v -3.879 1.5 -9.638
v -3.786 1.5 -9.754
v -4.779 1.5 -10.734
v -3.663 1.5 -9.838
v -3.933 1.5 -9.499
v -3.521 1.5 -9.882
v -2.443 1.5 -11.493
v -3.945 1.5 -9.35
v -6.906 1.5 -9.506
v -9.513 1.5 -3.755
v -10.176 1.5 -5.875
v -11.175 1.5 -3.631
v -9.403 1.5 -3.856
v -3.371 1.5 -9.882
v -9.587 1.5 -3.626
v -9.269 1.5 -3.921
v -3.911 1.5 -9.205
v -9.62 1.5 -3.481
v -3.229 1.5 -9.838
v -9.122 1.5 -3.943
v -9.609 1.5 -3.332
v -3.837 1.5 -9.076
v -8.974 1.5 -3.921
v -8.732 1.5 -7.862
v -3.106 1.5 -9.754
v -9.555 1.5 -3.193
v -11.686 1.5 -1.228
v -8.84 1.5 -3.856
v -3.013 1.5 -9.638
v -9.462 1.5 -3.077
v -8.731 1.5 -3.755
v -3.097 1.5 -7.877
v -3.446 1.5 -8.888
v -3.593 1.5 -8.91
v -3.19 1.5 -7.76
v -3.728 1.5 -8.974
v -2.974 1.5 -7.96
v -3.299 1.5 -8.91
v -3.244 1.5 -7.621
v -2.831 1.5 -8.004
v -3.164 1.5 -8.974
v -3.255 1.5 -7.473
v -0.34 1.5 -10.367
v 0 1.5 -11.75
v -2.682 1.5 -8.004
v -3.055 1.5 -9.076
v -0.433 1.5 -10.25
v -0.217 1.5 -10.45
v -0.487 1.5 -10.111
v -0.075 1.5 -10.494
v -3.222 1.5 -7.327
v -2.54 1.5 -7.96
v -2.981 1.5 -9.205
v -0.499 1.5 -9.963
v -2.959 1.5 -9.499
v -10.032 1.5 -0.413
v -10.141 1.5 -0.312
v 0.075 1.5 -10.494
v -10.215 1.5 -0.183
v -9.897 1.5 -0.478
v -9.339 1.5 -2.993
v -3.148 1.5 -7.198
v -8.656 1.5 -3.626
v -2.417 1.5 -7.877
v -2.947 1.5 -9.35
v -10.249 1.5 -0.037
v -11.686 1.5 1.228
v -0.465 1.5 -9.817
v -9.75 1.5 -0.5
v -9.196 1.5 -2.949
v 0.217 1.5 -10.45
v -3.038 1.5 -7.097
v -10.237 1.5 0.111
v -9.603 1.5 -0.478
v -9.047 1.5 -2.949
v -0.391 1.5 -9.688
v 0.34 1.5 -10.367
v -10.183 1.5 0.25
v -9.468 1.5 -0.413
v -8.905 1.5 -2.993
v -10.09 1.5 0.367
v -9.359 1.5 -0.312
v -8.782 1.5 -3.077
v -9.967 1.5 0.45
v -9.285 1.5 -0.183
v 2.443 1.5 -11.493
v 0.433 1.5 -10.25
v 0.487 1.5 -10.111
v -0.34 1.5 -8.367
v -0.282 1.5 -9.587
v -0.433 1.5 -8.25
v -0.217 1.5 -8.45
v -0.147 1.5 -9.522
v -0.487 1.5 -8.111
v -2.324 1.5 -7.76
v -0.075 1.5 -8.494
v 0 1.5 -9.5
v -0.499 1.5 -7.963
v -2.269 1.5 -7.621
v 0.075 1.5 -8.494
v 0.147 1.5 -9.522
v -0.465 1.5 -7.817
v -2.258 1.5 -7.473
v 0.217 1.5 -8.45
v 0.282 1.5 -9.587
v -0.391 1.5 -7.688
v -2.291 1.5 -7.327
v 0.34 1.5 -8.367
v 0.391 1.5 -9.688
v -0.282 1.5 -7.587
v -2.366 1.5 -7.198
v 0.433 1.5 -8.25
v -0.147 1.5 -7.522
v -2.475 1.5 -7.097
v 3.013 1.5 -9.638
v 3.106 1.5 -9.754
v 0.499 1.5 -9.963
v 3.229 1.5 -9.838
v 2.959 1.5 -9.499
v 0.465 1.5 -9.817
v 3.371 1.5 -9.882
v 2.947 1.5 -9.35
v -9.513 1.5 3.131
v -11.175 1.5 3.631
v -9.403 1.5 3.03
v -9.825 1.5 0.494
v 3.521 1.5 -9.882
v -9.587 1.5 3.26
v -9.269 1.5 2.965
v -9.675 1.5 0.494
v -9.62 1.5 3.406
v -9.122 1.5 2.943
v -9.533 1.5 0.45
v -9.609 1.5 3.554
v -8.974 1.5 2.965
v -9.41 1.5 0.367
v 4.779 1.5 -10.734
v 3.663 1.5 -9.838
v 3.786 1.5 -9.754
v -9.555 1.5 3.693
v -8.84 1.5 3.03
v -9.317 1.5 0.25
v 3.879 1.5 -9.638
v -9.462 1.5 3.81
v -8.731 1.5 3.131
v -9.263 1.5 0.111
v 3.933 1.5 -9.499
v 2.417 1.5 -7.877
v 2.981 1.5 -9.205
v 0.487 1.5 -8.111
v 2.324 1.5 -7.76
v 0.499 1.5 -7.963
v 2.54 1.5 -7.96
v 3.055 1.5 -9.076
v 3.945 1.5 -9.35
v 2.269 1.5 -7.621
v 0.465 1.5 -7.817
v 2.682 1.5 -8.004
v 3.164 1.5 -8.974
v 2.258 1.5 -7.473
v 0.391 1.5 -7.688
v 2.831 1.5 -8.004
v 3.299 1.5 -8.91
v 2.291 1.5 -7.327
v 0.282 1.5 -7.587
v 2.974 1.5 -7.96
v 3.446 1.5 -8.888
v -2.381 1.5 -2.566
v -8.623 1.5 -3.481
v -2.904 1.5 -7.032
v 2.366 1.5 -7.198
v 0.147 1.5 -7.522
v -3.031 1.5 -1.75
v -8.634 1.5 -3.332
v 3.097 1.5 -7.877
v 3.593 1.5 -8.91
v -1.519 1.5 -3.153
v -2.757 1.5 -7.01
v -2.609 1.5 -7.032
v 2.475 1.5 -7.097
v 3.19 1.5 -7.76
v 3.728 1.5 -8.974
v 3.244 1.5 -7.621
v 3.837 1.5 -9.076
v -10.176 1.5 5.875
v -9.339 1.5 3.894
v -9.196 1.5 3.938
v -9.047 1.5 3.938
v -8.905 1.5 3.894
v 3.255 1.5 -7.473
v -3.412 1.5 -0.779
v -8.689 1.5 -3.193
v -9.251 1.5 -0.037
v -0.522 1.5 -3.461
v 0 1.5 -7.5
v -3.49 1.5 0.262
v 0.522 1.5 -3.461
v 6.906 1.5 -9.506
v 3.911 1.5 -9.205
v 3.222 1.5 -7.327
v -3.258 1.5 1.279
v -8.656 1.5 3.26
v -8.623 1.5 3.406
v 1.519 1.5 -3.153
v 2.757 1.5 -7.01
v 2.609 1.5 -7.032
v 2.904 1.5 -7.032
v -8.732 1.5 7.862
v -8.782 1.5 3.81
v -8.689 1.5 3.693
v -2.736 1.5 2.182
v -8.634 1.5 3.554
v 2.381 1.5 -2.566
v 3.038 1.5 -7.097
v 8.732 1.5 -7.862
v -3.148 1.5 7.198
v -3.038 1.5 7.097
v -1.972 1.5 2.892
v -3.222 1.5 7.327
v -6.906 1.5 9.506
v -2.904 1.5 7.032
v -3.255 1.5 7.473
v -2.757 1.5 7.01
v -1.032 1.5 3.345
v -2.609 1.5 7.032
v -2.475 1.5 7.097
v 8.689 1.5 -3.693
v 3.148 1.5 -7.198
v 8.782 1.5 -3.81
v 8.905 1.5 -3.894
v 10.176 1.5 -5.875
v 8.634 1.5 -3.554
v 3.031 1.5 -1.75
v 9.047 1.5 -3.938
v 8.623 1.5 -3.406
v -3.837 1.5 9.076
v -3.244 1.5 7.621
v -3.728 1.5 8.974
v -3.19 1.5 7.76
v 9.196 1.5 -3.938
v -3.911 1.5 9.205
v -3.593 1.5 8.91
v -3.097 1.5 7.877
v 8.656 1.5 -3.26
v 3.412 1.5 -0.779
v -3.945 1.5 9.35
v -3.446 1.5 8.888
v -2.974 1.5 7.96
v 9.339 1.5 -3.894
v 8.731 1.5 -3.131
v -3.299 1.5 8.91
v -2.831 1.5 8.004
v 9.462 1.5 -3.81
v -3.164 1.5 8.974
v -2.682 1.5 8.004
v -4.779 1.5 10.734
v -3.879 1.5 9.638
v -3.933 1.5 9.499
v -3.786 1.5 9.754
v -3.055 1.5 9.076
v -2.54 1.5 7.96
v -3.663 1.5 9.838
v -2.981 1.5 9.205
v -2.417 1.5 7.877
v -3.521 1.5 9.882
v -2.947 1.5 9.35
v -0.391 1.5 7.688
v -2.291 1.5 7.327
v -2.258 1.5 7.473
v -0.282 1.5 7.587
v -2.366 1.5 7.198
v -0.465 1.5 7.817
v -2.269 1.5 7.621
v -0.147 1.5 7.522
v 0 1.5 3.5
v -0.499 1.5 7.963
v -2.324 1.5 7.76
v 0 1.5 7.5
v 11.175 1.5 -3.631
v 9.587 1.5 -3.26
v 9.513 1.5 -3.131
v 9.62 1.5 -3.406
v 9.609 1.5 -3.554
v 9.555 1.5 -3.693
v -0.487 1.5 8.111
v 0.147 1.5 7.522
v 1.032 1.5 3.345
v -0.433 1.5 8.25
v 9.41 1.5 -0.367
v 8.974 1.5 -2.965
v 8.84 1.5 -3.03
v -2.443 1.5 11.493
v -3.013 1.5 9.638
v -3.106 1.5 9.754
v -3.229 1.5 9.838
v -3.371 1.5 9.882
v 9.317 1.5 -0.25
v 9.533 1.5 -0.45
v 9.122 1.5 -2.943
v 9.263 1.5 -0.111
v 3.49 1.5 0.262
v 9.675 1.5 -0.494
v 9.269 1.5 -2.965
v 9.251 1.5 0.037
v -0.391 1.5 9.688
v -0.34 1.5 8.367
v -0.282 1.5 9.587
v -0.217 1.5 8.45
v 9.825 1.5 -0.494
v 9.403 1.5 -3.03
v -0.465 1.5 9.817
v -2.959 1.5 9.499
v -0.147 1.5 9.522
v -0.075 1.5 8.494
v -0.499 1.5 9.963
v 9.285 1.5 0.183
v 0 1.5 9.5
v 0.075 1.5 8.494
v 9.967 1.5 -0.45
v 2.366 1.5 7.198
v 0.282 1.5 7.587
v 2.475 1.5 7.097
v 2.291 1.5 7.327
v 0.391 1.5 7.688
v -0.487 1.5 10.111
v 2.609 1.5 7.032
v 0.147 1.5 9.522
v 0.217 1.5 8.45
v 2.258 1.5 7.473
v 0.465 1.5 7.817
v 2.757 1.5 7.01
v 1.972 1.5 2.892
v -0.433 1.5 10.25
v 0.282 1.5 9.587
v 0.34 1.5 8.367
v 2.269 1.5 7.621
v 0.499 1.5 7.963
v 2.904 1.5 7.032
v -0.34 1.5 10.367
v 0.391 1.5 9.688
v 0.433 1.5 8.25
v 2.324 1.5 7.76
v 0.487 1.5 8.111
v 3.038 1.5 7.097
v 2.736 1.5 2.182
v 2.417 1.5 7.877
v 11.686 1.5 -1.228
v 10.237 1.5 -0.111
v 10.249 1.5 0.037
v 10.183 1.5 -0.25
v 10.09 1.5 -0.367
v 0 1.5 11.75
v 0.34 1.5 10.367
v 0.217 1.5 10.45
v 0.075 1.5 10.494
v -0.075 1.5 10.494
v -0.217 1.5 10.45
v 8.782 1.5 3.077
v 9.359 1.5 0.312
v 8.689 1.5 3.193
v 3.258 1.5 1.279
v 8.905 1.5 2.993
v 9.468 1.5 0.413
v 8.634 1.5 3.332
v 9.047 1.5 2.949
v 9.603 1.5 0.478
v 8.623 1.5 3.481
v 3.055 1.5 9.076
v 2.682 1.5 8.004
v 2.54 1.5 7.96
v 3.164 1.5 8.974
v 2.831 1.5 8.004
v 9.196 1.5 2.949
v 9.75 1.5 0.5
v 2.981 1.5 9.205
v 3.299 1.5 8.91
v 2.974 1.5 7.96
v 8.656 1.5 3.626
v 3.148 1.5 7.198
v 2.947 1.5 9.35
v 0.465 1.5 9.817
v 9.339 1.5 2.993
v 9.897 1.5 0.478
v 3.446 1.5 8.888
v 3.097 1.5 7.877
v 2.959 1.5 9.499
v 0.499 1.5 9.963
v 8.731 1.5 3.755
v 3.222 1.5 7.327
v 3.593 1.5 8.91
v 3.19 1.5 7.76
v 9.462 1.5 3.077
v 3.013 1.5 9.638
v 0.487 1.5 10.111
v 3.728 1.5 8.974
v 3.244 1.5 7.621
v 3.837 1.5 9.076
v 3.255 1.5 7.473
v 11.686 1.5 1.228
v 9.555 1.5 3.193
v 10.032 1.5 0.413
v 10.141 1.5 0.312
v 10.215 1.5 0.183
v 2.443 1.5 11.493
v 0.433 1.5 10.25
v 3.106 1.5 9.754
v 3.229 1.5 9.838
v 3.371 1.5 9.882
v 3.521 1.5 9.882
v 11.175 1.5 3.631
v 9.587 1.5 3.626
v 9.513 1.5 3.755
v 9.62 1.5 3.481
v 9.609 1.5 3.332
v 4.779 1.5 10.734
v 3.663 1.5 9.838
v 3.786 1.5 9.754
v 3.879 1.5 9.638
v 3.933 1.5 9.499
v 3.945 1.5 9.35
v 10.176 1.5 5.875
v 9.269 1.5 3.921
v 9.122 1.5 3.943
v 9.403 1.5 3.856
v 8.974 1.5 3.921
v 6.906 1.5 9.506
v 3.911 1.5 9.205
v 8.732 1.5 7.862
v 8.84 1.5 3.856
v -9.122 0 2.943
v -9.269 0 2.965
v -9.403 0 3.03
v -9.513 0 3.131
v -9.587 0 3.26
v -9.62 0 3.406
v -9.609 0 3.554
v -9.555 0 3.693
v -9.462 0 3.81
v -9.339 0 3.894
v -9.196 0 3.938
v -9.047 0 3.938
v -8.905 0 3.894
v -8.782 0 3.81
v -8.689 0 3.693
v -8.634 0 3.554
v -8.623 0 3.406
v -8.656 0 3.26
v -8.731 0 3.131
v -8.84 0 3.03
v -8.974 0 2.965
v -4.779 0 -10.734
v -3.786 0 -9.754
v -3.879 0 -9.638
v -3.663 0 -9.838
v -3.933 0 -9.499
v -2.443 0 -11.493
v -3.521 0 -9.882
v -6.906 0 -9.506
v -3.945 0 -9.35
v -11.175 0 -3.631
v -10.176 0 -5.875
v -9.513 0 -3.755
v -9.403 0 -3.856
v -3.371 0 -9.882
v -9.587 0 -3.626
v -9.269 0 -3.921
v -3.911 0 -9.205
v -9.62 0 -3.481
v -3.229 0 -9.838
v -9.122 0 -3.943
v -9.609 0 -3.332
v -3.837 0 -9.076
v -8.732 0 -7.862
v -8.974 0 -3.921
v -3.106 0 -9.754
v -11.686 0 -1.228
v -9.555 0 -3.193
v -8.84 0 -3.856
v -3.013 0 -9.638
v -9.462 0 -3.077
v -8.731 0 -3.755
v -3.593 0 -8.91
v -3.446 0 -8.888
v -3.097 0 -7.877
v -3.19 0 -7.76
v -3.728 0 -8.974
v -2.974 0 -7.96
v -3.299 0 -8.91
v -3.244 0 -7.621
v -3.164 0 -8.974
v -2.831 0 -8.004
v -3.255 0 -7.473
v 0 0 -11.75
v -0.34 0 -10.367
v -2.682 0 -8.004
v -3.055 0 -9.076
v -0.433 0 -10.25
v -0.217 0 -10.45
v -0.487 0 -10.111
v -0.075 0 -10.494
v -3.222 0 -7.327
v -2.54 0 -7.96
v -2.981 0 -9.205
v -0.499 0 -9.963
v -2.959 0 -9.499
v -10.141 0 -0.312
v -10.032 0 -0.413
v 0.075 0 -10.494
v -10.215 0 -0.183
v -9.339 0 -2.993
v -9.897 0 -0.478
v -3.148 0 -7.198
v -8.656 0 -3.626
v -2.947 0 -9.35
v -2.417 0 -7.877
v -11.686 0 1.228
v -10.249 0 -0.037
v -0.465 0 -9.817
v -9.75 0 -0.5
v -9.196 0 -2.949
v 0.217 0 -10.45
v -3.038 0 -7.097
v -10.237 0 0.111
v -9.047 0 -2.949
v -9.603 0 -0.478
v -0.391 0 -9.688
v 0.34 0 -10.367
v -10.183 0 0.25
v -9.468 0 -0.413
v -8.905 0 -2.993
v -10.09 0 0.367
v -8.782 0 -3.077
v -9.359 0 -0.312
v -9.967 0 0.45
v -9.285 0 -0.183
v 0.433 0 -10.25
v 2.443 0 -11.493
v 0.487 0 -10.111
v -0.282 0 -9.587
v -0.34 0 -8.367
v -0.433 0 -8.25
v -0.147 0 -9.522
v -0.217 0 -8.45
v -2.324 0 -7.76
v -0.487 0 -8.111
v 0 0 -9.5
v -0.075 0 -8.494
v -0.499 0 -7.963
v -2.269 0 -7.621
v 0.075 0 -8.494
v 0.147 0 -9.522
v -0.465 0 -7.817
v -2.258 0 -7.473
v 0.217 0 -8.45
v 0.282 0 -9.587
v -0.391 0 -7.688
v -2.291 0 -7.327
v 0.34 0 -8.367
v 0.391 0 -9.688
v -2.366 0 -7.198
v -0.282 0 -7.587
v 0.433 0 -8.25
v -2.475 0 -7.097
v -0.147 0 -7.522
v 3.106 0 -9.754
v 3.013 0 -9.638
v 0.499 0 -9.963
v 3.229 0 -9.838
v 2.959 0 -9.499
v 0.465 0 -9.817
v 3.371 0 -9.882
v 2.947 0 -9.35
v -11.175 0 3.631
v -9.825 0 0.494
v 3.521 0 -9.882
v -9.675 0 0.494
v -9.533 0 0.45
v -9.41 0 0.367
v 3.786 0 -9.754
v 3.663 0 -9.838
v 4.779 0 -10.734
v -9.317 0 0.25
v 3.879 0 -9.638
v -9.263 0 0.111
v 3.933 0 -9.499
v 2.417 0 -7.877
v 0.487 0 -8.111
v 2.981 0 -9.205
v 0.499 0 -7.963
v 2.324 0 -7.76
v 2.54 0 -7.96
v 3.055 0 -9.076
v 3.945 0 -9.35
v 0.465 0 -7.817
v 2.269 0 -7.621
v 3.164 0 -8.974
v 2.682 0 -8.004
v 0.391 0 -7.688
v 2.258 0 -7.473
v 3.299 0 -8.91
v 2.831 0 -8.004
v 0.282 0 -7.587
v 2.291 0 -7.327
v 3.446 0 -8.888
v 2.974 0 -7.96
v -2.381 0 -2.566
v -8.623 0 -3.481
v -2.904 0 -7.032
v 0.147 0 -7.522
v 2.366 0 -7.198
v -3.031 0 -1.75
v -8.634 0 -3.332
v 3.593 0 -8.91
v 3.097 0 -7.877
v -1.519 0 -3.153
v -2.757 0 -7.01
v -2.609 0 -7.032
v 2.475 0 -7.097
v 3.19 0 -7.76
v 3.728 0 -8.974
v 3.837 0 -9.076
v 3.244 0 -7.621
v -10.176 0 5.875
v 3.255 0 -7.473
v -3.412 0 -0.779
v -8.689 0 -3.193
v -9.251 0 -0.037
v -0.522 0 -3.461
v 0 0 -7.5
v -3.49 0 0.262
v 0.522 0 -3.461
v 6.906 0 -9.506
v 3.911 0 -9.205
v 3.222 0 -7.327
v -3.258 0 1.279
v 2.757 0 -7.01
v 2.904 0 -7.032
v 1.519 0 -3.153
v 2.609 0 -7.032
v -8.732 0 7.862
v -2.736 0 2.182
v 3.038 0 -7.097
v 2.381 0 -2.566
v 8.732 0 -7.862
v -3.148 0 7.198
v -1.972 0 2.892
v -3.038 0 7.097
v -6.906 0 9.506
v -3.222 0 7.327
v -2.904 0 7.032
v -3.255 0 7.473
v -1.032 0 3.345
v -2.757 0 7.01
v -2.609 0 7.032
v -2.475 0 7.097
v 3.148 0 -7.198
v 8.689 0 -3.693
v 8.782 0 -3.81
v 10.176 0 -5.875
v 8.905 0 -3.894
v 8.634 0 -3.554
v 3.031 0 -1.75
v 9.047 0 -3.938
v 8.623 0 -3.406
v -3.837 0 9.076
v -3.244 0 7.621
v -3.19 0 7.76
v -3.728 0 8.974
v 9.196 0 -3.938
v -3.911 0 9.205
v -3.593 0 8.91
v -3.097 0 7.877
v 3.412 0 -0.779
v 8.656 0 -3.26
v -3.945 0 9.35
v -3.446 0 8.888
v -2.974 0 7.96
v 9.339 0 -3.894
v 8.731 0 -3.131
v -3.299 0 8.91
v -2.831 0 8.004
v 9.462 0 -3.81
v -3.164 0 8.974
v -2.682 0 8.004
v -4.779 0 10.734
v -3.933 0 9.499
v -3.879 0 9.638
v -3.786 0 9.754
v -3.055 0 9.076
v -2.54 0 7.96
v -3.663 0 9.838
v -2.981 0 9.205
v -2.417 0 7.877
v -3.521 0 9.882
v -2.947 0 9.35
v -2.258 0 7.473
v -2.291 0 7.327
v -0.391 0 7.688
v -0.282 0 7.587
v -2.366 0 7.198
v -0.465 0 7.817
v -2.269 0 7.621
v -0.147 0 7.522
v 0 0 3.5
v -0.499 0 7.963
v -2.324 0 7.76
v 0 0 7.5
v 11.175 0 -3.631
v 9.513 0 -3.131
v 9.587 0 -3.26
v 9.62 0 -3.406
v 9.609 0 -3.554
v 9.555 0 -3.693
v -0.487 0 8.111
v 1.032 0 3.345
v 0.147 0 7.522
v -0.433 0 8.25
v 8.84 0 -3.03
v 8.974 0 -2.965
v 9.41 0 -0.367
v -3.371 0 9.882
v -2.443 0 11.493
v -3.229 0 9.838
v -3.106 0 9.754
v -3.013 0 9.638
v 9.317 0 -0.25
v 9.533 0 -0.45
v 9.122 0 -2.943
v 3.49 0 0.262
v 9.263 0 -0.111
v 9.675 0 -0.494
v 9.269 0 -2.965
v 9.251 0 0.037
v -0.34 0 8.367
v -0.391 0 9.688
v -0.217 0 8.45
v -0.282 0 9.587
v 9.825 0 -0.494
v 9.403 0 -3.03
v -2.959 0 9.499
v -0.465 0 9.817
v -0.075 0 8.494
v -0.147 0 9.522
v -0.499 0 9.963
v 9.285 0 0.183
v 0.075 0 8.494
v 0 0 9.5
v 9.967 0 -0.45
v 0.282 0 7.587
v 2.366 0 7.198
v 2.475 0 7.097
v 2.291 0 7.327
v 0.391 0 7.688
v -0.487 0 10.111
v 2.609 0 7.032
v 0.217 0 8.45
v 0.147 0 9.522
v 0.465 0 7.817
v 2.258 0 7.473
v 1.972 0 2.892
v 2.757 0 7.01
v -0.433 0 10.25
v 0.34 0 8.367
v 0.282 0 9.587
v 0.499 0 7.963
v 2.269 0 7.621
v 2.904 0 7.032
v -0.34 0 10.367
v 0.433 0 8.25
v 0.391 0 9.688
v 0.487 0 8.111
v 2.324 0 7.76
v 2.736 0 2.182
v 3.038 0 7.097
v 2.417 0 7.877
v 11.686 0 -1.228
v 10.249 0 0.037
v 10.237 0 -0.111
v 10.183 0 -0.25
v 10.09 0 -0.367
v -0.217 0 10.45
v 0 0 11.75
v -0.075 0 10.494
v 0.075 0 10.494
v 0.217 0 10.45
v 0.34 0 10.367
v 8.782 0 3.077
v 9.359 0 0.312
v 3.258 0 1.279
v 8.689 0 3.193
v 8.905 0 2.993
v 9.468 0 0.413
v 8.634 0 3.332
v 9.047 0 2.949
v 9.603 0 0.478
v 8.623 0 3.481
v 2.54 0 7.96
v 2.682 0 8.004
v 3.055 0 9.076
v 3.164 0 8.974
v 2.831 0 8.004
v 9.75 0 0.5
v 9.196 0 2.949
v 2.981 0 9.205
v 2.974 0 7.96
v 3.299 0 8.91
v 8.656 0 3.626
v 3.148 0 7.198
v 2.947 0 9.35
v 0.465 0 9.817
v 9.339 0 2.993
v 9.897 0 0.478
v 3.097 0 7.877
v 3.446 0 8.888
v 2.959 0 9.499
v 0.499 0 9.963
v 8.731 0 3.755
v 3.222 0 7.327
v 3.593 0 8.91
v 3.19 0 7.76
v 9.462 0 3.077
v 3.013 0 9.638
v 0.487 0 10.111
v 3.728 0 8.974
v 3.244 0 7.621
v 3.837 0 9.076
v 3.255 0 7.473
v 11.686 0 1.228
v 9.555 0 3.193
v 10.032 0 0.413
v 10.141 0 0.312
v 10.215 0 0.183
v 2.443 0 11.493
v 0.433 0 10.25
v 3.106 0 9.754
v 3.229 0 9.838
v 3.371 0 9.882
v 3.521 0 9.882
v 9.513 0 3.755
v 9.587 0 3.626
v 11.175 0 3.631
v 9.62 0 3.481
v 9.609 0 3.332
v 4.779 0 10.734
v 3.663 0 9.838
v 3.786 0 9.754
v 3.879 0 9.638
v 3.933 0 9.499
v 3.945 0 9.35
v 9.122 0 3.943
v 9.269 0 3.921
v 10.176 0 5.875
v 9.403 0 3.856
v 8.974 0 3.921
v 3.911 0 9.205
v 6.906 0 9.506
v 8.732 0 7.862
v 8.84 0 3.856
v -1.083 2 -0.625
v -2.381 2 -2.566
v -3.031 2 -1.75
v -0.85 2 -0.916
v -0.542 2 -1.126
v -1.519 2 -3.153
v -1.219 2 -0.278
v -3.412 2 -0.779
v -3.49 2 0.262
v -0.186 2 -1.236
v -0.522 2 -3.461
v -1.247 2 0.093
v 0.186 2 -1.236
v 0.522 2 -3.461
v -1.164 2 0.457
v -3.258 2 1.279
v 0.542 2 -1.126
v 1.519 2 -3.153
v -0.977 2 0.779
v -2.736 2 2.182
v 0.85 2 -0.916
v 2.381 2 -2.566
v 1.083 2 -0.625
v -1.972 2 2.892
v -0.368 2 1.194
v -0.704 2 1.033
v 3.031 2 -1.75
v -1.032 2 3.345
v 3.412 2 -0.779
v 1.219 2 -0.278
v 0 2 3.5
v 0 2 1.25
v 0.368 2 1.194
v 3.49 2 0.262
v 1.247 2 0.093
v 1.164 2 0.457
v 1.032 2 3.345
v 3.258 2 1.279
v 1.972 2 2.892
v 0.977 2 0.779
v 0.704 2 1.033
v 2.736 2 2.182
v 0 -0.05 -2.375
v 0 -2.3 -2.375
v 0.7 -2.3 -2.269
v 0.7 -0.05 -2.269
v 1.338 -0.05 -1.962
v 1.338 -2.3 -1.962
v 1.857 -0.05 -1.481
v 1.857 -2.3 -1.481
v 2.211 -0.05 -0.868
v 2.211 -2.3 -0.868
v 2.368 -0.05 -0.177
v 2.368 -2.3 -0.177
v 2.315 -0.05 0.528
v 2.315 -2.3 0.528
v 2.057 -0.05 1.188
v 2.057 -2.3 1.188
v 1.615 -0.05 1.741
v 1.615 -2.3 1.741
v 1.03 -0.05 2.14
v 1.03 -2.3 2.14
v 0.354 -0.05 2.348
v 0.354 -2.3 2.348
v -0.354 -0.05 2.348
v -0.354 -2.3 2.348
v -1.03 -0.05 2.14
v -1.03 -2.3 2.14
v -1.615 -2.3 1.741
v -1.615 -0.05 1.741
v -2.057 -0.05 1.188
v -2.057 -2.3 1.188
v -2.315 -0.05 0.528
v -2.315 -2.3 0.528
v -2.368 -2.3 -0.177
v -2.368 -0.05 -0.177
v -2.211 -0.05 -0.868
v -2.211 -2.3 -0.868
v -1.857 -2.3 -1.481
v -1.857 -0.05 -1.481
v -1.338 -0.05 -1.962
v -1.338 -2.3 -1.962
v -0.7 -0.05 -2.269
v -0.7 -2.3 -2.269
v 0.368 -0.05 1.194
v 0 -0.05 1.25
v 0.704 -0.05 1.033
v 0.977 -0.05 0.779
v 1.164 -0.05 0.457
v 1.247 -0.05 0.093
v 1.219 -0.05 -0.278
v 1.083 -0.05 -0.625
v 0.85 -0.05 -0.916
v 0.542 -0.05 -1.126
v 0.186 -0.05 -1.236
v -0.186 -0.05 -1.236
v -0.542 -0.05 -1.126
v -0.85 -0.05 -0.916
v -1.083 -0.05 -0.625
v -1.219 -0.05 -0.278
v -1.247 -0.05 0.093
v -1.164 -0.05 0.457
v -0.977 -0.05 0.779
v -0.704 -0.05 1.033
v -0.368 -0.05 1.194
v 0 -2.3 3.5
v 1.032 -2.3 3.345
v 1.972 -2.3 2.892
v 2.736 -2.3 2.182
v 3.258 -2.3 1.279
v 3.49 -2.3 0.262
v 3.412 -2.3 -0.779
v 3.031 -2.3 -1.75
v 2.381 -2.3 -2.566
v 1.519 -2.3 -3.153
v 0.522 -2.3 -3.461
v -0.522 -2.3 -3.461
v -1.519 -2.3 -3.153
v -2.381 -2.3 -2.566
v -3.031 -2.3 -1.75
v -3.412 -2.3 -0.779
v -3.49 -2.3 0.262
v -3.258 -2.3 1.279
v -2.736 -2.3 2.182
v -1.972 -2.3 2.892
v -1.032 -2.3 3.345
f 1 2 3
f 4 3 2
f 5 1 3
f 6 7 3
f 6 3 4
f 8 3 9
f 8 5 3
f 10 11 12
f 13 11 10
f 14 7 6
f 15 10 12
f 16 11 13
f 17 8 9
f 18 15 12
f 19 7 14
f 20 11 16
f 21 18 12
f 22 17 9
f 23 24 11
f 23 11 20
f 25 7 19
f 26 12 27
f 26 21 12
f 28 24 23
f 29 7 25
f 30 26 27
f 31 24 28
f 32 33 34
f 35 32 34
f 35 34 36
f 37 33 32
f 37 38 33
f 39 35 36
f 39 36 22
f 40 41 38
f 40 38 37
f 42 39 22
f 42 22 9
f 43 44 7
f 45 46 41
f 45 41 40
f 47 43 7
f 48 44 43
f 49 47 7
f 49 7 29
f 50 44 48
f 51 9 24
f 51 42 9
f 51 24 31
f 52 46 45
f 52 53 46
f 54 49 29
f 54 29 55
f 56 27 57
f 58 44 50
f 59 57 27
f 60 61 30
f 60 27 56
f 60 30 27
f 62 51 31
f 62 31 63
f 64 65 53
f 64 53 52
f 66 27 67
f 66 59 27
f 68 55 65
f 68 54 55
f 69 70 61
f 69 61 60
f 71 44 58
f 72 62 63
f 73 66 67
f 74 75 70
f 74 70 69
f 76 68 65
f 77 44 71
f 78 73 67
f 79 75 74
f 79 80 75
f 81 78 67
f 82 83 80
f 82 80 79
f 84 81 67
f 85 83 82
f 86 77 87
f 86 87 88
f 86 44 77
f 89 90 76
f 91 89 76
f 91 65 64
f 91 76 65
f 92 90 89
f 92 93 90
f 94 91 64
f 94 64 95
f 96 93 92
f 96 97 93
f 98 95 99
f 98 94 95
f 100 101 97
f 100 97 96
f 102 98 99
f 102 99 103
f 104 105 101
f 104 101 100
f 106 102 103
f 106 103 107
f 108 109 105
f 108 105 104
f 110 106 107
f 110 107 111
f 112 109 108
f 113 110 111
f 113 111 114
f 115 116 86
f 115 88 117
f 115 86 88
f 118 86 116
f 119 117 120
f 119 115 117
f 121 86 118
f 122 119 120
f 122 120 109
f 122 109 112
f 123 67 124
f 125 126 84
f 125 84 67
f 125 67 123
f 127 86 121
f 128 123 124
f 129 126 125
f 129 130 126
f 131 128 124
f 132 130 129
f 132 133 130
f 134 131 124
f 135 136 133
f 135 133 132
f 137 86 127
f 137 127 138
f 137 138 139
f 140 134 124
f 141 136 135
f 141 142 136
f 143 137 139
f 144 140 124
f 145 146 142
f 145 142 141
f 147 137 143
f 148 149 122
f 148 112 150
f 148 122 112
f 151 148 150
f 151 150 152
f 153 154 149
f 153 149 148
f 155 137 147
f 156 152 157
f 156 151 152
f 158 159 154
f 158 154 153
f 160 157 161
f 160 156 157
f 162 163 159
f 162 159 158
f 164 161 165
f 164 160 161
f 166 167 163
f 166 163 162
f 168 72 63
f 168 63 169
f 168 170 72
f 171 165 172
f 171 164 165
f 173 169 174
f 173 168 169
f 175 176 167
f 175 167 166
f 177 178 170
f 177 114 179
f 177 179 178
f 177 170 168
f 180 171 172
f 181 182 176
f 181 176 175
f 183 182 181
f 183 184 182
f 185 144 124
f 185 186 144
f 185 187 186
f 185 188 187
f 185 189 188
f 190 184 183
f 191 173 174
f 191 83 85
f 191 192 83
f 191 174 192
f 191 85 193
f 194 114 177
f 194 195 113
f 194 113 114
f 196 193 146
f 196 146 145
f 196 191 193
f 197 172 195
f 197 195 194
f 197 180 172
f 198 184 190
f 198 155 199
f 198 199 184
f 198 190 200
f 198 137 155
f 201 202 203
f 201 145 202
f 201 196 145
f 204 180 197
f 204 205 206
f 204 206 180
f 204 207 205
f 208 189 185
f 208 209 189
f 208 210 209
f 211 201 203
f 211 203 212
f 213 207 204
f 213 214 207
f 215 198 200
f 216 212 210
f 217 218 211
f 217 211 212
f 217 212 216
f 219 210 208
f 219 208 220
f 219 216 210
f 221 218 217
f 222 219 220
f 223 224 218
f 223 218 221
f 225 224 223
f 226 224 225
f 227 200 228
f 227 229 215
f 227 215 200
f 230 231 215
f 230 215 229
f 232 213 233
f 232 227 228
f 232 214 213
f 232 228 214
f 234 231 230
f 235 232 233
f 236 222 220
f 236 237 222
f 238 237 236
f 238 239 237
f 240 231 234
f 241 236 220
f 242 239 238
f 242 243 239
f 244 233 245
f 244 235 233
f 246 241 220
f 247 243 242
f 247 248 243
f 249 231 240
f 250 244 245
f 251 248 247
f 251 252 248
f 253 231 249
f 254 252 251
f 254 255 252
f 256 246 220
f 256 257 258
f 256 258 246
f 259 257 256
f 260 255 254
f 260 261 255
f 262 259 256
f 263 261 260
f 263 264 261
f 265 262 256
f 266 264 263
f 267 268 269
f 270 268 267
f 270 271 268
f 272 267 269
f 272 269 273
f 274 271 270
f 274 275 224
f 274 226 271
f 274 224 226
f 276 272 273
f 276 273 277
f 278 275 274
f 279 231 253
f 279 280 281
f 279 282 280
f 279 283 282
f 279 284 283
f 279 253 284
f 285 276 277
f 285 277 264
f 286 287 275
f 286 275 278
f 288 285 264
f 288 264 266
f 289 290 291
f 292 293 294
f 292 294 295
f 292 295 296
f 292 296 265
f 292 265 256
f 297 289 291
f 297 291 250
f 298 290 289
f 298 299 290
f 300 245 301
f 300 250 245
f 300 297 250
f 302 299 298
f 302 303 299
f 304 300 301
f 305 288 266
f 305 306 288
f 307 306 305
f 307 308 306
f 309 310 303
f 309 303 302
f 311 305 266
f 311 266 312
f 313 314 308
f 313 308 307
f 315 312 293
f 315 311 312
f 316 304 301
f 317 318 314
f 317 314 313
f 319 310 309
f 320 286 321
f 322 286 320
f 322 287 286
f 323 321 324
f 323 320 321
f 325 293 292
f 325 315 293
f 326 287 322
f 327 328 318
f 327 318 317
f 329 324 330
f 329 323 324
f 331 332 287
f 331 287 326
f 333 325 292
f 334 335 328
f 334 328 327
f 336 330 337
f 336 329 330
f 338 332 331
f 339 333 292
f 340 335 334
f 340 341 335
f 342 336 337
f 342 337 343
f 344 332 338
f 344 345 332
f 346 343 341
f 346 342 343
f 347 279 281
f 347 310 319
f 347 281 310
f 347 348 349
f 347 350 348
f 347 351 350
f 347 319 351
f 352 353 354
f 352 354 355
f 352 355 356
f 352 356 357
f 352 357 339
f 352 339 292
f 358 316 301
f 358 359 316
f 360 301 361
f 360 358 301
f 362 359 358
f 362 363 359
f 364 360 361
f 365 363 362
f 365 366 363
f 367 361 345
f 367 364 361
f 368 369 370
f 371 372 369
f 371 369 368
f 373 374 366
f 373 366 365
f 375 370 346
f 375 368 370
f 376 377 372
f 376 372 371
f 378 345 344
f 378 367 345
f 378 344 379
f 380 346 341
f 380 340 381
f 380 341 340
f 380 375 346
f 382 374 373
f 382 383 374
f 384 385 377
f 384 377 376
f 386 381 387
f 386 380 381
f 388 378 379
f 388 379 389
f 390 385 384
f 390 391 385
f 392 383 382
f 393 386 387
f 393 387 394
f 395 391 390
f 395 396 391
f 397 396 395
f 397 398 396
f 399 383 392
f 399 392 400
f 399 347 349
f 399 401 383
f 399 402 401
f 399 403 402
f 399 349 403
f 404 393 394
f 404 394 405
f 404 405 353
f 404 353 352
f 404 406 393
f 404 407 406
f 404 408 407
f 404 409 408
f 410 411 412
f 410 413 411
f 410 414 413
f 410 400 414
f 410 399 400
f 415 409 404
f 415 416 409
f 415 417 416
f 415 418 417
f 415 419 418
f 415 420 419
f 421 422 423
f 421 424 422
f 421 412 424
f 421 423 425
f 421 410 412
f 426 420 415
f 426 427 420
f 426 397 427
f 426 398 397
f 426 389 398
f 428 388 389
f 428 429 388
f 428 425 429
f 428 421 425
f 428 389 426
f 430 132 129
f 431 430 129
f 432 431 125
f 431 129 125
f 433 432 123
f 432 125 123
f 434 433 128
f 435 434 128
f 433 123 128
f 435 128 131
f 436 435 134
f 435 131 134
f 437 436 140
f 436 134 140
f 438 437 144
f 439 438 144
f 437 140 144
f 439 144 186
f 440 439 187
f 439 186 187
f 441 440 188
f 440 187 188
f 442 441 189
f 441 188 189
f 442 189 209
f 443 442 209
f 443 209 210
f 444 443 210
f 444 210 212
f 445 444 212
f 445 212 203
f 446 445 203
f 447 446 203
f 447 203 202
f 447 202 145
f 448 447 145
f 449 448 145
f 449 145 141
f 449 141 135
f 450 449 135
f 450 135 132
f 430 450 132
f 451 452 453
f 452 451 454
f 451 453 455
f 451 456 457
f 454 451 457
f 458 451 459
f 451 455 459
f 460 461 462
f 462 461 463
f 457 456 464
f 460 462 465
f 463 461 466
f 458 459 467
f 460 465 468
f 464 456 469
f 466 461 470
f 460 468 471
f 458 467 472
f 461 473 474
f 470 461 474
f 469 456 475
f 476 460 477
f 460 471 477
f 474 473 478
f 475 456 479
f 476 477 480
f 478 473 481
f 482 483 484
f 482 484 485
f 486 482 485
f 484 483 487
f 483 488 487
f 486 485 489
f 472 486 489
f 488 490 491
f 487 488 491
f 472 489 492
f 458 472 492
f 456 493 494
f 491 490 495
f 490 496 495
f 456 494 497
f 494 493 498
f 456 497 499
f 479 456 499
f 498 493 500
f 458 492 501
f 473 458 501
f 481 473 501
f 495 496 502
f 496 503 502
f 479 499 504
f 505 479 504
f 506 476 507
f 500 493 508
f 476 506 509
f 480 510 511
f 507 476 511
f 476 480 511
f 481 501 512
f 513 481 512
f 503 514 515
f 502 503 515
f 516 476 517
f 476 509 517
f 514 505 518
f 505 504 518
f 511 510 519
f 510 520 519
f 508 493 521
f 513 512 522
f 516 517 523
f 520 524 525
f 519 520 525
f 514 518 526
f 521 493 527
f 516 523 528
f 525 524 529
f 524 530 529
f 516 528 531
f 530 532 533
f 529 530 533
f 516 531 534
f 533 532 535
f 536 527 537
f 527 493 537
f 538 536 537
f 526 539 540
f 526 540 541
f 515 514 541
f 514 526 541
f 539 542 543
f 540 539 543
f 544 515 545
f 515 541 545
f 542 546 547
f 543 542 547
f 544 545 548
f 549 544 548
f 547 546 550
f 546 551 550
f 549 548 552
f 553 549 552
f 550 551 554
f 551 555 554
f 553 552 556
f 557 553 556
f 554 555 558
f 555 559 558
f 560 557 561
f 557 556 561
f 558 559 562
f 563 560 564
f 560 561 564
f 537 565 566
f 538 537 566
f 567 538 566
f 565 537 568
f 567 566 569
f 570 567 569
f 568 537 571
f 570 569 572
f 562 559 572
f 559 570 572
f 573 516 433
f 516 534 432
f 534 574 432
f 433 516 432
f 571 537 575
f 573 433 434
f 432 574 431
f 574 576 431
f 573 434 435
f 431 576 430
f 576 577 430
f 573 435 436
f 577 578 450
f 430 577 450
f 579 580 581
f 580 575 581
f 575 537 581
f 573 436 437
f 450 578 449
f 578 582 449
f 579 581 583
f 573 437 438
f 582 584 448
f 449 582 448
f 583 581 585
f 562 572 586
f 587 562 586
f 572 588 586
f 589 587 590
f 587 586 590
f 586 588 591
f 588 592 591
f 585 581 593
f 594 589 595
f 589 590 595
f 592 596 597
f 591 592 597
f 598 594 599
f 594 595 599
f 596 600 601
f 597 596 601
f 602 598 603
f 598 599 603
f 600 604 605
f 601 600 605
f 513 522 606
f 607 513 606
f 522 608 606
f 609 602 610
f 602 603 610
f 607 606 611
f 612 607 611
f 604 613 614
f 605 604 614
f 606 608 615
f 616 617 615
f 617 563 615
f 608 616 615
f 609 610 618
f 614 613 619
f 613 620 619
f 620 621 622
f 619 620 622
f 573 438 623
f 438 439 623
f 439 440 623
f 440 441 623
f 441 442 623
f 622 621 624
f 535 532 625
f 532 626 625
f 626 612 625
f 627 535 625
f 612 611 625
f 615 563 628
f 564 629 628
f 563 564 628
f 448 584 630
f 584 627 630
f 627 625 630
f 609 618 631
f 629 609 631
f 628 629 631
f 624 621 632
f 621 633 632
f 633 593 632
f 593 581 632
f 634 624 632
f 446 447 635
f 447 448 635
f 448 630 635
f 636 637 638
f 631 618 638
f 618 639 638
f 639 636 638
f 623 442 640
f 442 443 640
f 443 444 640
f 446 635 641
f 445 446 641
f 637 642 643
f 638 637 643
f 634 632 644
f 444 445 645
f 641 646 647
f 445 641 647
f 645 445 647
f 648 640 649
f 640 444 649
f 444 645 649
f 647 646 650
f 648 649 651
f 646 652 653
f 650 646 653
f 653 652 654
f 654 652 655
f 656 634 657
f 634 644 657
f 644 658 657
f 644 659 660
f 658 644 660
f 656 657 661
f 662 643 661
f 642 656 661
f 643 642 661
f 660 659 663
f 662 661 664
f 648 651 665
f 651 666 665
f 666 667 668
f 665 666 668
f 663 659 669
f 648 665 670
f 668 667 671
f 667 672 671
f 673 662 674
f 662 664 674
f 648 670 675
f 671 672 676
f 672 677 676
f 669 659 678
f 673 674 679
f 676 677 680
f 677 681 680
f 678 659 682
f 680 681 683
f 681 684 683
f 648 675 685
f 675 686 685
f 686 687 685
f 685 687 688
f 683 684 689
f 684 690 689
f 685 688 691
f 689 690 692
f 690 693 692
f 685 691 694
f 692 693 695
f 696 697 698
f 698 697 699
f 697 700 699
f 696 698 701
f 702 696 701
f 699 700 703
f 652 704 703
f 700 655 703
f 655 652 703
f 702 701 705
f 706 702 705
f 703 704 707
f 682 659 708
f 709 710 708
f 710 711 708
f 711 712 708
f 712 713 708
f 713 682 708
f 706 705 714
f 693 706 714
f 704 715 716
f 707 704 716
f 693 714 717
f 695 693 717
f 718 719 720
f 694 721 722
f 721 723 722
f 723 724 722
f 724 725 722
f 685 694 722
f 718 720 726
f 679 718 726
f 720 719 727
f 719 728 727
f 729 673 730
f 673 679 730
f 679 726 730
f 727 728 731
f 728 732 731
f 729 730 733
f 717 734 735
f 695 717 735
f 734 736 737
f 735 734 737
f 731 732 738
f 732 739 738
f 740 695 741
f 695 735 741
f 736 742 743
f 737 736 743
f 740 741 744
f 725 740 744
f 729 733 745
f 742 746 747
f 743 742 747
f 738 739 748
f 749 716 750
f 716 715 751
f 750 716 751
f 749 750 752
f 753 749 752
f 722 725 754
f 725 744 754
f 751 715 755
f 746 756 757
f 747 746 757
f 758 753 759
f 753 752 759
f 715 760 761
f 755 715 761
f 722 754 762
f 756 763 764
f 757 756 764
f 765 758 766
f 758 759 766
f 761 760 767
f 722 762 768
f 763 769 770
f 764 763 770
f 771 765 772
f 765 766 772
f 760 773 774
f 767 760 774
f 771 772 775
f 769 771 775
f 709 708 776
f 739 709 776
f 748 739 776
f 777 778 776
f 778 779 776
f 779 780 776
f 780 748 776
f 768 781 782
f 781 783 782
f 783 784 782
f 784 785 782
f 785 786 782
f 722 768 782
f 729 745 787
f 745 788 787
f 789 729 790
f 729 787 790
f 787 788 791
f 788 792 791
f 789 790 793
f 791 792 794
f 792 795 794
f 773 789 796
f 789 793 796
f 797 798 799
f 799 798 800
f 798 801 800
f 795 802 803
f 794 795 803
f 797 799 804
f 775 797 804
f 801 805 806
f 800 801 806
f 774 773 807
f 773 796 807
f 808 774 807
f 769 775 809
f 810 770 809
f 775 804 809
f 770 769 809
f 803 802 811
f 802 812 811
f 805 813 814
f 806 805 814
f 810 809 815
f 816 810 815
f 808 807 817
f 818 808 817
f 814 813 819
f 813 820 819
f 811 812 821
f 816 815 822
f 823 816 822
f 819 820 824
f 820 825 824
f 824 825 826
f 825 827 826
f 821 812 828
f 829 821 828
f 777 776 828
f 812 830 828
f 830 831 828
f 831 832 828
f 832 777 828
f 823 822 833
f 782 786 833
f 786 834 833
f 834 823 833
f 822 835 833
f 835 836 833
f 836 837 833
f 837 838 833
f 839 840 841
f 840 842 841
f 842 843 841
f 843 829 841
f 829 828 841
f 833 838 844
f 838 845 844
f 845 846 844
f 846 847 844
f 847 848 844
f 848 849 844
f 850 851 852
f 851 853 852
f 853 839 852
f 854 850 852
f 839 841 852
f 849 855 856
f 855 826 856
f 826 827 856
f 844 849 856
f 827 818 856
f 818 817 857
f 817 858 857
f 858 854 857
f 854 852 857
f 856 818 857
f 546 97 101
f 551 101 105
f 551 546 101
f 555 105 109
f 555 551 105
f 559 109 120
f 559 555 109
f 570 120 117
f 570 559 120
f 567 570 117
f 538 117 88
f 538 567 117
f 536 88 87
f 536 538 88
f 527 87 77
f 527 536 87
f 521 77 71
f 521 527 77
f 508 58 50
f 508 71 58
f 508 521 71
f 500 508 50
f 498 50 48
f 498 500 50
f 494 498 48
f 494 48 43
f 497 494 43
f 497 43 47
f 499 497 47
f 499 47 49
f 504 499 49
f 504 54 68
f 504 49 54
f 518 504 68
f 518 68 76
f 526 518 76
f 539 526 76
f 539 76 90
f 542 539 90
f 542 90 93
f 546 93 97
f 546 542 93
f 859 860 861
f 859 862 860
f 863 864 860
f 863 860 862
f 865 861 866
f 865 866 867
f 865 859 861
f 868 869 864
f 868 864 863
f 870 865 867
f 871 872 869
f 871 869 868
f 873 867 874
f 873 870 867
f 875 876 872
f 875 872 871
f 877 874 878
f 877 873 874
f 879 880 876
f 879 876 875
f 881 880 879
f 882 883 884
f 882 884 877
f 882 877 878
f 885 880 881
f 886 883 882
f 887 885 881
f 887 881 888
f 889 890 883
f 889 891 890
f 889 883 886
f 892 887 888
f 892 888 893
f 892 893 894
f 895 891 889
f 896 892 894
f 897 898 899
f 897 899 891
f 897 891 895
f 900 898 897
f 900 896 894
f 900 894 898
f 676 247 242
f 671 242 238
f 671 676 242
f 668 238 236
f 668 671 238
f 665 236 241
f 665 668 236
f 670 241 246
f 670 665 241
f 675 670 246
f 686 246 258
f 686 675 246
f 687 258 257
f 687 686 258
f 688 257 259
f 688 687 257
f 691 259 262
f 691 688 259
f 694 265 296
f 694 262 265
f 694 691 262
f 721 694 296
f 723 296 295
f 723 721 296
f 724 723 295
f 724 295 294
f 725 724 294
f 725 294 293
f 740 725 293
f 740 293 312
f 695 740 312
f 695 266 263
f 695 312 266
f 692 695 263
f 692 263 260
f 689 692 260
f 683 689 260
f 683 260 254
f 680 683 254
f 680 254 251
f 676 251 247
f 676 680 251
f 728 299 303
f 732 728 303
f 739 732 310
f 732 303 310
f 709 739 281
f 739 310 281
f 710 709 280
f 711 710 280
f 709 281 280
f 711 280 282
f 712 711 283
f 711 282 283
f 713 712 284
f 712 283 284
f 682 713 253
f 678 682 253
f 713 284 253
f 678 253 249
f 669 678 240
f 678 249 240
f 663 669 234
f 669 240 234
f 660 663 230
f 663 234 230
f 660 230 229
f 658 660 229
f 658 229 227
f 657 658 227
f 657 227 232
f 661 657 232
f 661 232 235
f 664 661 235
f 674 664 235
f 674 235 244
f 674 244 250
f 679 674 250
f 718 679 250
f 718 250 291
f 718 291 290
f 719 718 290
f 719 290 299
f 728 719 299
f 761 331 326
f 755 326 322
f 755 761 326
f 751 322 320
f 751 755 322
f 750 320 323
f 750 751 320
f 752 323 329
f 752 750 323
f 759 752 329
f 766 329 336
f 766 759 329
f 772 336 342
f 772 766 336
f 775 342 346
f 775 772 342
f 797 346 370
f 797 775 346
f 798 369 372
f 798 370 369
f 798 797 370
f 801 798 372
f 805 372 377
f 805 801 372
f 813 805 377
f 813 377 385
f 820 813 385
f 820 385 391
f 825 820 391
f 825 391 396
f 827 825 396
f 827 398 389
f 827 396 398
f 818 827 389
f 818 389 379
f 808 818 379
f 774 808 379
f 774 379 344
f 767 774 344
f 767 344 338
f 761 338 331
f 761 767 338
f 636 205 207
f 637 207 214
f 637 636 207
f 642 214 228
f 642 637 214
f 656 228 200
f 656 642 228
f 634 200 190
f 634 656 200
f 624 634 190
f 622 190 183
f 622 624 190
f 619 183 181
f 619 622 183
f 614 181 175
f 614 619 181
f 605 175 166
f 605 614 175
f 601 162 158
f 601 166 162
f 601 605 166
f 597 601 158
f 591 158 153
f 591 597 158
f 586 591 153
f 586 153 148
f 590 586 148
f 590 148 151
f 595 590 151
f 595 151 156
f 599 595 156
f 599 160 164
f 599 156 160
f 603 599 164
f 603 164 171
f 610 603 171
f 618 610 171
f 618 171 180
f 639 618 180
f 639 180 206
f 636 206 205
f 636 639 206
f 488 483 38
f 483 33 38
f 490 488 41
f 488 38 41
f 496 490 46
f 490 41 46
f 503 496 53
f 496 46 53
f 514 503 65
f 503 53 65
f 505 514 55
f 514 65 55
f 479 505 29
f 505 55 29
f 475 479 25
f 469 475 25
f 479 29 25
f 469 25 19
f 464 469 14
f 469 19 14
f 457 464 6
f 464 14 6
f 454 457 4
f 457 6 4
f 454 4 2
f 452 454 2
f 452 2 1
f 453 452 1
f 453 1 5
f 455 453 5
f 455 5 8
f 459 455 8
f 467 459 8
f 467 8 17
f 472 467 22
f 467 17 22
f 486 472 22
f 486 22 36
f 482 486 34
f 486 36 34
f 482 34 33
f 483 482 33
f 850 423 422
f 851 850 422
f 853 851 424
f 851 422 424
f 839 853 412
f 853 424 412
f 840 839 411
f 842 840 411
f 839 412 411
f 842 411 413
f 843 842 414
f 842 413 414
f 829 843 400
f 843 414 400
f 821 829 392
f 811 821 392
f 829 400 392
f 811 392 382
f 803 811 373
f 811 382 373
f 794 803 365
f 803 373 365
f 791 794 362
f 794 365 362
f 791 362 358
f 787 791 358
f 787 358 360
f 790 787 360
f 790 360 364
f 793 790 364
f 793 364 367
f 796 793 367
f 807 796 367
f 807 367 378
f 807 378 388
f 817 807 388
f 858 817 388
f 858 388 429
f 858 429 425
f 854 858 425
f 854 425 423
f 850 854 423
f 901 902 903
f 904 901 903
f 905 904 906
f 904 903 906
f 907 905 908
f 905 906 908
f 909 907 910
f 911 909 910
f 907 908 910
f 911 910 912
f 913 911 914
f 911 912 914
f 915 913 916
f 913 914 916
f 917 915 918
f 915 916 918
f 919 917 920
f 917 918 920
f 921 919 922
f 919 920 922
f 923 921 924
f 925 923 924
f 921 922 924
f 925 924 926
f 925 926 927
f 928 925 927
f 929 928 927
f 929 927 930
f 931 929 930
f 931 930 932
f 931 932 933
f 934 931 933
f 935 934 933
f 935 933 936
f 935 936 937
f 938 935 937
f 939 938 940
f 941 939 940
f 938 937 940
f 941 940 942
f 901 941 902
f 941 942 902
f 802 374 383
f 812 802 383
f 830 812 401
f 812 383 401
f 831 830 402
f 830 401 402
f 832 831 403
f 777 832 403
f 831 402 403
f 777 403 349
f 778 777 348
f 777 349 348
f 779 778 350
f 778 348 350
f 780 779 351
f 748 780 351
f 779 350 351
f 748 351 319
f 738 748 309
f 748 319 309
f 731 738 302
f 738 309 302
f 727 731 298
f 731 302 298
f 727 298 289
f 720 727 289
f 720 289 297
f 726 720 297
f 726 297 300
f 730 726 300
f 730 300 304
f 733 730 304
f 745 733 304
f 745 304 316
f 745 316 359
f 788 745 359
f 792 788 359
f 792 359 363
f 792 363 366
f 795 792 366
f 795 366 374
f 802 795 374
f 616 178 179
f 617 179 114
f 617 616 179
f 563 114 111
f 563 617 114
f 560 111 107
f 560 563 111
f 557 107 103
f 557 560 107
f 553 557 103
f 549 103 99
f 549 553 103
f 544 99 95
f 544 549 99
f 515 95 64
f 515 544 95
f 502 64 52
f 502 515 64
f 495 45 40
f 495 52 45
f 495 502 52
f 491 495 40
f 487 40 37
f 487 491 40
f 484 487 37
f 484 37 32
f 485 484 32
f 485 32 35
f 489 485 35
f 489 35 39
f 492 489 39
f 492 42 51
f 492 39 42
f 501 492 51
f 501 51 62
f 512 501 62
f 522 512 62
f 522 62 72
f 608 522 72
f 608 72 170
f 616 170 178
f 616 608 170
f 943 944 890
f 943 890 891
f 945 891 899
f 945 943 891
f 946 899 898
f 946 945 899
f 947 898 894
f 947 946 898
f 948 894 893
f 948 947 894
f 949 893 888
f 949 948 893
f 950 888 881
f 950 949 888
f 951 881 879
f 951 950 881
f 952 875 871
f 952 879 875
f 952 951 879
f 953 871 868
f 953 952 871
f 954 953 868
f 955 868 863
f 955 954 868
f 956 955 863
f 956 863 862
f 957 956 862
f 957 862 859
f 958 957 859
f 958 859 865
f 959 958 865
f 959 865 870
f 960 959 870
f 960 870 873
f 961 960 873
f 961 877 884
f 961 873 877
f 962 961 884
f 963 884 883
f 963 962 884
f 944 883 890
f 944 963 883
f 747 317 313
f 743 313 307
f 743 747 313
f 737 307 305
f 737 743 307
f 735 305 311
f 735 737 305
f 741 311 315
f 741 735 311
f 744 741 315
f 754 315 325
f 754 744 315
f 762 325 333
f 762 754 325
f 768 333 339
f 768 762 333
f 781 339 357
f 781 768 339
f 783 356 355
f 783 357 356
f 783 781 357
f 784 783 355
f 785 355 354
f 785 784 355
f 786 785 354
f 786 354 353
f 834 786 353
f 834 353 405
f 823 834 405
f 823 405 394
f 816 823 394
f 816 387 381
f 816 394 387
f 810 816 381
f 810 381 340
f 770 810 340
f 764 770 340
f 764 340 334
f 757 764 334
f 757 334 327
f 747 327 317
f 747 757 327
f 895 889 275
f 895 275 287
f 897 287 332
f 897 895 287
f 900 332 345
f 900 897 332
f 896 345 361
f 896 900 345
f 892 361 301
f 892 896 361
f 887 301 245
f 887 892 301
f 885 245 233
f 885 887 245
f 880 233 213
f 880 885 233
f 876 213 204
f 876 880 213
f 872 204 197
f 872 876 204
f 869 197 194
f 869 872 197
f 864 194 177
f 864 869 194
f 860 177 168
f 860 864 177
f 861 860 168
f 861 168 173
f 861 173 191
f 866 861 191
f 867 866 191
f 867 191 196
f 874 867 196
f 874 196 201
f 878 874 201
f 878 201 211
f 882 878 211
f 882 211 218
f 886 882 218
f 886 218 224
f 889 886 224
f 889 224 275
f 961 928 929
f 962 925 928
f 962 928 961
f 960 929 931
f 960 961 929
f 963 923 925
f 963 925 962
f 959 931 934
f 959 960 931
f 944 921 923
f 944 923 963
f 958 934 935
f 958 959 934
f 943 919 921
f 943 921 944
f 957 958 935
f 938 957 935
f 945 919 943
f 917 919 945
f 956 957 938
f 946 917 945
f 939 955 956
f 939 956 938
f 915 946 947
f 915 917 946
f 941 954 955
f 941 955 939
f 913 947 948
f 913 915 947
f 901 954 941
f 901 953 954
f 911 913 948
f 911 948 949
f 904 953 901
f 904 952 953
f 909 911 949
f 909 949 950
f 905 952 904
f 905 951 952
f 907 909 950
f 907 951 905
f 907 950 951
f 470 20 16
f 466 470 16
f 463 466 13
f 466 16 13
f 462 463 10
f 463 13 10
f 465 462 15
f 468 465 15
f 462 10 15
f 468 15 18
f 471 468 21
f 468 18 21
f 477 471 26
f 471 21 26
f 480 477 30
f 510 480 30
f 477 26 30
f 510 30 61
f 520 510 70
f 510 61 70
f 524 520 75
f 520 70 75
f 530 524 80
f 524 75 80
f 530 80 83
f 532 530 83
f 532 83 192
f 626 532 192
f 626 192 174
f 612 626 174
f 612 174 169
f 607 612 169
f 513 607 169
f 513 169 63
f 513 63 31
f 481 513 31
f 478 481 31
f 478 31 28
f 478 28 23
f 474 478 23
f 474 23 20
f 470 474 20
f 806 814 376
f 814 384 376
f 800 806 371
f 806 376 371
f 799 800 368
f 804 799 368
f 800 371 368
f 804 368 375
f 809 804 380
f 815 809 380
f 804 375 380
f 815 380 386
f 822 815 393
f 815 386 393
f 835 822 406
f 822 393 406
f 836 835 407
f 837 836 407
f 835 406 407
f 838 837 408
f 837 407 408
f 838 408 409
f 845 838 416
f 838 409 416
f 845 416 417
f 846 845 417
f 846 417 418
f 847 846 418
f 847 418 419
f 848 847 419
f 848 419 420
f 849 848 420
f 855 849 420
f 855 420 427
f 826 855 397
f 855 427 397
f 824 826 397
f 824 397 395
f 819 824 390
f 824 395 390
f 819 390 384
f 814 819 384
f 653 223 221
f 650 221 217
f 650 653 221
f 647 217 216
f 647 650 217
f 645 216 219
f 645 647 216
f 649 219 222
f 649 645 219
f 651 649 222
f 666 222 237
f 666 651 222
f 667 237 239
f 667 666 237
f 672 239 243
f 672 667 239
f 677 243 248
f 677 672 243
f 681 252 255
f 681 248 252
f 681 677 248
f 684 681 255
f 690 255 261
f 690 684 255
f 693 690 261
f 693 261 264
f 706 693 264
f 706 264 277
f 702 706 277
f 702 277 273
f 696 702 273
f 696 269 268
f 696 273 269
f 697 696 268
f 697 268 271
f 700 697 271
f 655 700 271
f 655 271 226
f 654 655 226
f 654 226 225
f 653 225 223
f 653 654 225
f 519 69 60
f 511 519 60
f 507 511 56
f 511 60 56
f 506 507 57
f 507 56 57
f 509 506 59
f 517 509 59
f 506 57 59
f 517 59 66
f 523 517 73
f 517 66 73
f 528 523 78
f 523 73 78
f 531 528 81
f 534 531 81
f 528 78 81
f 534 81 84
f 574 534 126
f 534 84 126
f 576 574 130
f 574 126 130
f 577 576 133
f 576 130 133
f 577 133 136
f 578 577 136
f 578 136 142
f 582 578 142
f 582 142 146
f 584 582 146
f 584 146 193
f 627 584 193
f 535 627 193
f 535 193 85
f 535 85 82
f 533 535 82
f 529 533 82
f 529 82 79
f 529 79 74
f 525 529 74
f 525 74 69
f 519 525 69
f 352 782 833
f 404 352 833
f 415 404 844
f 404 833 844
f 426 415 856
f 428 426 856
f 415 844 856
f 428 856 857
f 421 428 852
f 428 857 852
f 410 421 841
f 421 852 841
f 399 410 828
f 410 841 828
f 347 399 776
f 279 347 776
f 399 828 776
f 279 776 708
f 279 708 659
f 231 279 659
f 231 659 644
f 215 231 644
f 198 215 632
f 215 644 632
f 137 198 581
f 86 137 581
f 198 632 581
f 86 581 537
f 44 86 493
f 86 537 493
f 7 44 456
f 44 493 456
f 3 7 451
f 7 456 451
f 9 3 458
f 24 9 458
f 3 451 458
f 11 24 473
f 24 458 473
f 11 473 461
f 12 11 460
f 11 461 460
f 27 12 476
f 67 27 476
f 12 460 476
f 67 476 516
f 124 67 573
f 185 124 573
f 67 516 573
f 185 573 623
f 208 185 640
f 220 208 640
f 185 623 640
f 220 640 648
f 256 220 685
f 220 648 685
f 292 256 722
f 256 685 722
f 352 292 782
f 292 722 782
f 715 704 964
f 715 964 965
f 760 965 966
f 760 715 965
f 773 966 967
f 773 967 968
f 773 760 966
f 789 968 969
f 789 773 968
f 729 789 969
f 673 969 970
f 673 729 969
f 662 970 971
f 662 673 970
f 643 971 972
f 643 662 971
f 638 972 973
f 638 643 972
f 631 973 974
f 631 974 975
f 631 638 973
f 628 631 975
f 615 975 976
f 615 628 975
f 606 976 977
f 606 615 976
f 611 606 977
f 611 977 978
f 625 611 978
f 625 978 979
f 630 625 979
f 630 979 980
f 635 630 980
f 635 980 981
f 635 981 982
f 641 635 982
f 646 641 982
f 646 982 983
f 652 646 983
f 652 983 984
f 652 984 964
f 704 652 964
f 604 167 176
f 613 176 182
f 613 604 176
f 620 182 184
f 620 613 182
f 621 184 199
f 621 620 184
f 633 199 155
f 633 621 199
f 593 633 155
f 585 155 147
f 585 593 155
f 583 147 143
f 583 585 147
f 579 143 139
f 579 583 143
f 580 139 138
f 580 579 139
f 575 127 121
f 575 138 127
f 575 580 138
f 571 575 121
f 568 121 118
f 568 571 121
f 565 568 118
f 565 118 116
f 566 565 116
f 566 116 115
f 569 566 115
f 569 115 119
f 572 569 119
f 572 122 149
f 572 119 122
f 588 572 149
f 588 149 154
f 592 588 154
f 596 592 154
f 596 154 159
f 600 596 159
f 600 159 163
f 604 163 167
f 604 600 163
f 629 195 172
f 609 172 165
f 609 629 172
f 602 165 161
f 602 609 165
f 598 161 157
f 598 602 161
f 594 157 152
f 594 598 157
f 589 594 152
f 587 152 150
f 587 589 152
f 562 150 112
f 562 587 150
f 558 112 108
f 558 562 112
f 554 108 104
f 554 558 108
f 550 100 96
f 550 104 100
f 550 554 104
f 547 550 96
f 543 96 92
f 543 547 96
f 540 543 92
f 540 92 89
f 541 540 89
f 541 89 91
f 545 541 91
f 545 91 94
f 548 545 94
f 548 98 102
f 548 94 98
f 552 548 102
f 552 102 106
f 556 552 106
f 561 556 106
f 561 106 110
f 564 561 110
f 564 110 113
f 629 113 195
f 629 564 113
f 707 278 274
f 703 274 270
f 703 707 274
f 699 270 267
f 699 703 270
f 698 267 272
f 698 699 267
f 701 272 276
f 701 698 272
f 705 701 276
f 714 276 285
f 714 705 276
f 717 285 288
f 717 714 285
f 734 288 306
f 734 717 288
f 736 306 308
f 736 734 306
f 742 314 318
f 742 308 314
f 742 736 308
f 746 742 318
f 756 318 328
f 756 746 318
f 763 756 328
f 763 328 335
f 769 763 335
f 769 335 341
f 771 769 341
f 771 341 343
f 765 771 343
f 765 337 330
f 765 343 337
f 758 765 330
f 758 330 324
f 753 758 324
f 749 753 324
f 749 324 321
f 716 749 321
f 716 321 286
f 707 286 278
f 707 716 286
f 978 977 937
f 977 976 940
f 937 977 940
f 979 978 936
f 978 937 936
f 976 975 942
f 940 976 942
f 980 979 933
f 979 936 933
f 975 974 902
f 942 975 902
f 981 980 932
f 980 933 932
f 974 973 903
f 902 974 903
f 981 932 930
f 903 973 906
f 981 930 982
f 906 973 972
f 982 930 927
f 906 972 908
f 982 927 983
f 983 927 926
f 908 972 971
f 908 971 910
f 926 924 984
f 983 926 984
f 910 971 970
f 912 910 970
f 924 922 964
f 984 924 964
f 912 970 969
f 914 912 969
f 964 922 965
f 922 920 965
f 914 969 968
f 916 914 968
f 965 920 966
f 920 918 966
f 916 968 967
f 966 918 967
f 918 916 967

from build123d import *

# Parameters (mm, degrees)
SKETCH1_R               = 11.75
BOSS_EXTRUDE1_DEPTH     = 1.5
BOSS_EXTRUDE2_START     = 0.5
SKETCH2_R               = 3.5
BOSS_EXTRUDE2_DEPTH     = 4.3
CUT_EXTRUDE1_DEPTH      = 18.164352595
CUT_EXTRUDE1_DEPTH_BACK = 18.164352595
SKETCH3_R               = 1.25
SKETCH4_R               = 0.5
CUT_EXTRUDE2_DEPTH      = 18.045967265
SKETCH5_R               = 0.5
CUT_EXTRUDE3_DEPTH      = 17.77542846
CIRPATTERN1_COUNT       = 2
SKETCH6_R               = 2.375
CUT_EXTRUDE4_DEPTH      = 2.25


with BuildPart() as part:
    # Sketch1 → Boss-Extrude1 (new body)
    with BuildSketch(Plane(origin=(0, 0, 0), x_dir=(1, 0, 0), z_dir=(0, 1, 0))):
        Circle(SKETCH1_R)
    extrude(amount=BOSS_EXTRUDE1_DEPTH)

    # Sketch2 → Boss-Extrude2 (add)
    with BuildSketch(Plane(origin=(0, 1.5, 0), x_dir=(1, 0, 0), z_dir=(0, 1, 0)).offset(BOSS_EXTRUDE2_START)):
        Circle(SKETCH2_R)
    extrude(amount=-BOSS_EXTRUDE2_DEPTH)

    # Sketch3 → Cut-Extrude1 (cut, two sides: drawn at the far end of the back side and taken through both)
    with BuildSketch(Plane(origin=(0, 2, 0), x_dir=(1, 0, 0), z_dir=(0, 1, 0)).offset(-CUT_EXTRUDE1_DEPTH_BACK)):
        Circle(SKETCH3_R)
    extrude(amount=CUT_EXTRUDE1_DEPTH + CUT_EXTRUDE1_DEPTH_BACK, mode=Mode.SUBTRACT)

    # Sketch4 → Cut-Extrude2 (cut, through all)
    with BuildSketch(Plane(origin=(0, 1.5, 0), x_dir=(1, 0, 0), z_dir=(0, 1, 0))):
        with Locations((9.75, 0)):
            Circle(SKETCH4_R)
        with Locations((9.121794872, 3.443161094)):
            Circle(SKETCH4_R)
        with Locations((9.121794872, -3.443161094)):
            Circle(SKETCH4_R)
    cut_extrude2 = extrude(amount=-CUT_EXTRUDE2_DEPTH, mode=Mode.SUBTRACT)

    # Sketch5 → Cut-Extrude3 (cut, symmetric)
    with BuildSketch(Plane(origin=(0, 0, 0), x_dir=(1, 0, 0), z_dir=(0, 1, 0))):
        with Locations((0, 8)):
            Circle(SKETCH5_R)
        with Locations((0, 10)):
            Circle(SKETCH5_R)
        with Locations((3.445989517, 9.3875)):
            Circle(SKETCH5_R)
        with Locations((2.756791613, 7.51)):
            Circle(SKETCH5_R)
        with Locations((-2.756791613, 7.51)):
            Circle(SKETCH5_R)
        with Locations((-3.445989517, 9.3875)):
            Circle(SKETCH5_R)
    cut_extrude3 = extrude(amount=CUT_EXTRUDE3_DEPTH, both=True, mode=Mode.SUBTRACT)

    # CirPattern1: Cut-Extrude2, Cut-Extrude3 ×2 about axis
    cirpattern1_axis = Axis((0, 2.215, 0), (0, -1, 0))
    add([cut_extrude2.rotate(cirpattern1_axis, i * 360 / CIRPATTERN1_COUNT) for i in range(1, CIRPATTERN1_COUNT)], mode=Mode.SUBTRACT)
    add([cut_extrude3.rotate(cirpattern1_axis, i * 360 / CIRPATTERN1_COUNT) for i in range(1, CIRPATTERN1_COUNT)], mode=Mode.SUBTRACT)

    # Sketch6 → Cut-Extrude4 (cut)
    with BuildSketch(Plane.XZ.offset(2.3)):
        Circle(SKETCH6_R)
    extrude(amount=-CUT_EXTRUDE4_DEPTH, mode=Mode.SUBTRACT)


solid = part.part
